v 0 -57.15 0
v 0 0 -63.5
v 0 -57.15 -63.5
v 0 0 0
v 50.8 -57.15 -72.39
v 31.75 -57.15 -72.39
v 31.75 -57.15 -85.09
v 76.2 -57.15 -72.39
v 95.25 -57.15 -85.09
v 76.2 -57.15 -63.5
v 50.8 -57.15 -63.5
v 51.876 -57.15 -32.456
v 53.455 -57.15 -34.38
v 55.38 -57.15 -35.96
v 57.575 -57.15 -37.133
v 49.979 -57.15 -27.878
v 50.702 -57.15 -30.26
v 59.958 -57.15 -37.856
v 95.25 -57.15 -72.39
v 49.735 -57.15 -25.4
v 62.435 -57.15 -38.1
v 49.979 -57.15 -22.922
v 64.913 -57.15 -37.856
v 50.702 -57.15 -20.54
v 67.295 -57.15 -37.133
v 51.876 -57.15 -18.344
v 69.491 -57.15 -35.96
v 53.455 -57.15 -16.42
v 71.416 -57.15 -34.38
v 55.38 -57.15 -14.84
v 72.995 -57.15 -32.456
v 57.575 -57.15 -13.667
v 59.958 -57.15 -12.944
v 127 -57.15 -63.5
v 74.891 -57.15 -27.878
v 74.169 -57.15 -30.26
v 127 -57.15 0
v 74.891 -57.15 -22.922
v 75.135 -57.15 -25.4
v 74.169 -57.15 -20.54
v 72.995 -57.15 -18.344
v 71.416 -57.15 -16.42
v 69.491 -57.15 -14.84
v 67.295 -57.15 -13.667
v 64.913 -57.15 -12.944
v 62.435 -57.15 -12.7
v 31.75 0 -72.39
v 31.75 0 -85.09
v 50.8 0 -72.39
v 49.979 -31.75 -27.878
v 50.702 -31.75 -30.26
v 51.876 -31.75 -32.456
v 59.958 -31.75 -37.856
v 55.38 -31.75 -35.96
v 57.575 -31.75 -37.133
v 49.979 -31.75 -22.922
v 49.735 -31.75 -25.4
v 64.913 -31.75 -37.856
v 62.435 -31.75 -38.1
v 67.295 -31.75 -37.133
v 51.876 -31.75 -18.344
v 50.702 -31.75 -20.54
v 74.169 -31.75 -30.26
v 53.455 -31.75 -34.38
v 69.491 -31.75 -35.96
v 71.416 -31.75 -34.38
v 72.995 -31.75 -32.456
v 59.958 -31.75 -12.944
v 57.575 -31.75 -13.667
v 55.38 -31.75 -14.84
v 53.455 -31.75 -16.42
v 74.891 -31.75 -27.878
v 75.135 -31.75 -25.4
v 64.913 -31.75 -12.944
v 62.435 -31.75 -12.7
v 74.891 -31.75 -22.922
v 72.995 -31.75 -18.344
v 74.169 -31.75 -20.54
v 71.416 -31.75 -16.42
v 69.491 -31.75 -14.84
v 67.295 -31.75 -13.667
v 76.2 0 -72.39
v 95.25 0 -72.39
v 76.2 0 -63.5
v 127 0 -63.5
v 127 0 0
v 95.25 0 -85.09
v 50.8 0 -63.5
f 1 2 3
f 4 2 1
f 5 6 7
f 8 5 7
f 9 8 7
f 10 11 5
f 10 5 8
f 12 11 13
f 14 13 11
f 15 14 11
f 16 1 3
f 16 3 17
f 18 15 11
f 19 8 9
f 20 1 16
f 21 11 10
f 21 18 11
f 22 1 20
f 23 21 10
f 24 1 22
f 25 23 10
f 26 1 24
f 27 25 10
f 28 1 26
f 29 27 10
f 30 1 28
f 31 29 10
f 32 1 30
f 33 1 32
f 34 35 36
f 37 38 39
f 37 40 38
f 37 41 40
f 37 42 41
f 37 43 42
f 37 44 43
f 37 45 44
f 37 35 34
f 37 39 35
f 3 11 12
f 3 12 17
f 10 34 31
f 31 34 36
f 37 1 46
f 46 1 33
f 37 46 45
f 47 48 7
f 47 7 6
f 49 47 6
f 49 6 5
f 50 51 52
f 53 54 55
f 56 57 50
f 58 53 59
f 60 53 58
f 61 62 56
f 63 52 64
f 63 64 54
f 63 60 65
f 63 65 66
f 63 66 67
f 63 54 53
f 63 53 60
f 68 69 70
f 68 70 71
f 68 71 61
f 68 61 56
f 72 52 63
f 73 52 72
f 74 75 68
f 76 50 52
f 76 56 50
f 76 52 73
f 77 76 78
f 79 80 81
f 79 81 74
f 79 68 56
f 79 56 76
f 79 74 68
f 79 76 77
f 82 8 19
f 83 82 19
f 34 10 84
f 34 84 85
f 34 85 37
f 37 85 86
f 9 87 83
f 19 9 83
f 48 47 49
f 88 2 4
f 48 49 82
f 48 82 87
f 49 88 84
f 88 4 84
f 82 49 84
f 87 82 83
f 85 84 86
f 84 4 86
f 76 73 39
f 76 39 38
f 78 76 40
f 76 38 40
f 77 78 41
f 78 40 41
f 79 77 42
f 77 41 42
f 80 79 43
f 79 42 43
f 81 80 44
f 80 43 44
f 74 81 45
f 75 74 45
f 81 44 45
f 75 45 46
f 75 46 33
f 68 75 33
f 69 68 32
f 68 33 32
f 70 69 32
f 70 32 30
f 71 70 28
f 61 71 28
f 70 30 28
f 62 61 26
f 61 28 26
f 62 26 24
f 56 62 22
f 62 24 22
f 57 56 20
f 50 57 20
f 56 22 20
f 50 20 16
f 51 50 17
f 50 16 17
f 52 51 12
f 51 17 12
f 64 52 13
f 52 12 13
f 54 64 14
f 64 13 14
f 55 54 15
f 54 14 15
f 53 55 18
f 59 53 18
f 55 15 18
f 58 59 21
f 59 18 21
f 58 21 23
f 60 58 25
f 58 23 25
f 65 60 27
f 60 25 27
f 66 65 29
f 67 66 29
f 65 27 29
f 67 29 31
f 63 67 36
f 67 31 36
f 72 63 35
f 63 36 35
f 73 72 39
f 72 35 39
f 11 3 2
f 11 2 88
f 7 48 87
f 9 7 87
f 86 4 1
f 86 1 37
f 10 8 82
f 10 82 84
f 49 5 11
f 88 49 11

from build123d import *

# Parameters (mm, degrees)
F0_W      = 127
F0_H      = 85.09
F1_DEPTH  = 57.15
F2_W      = 31.75
F2_H      = 12.7
F3_DEPTH  = 57.15
F4_W      = 50.8
F4_H      = 8.89
F5_DEPTH  = 57.15
F6_W      = 31.75
F6_H      = 12.7
F7_DEPTH  = 57.15
F8_W      = 50.8
F8_H      = 8.89
F9_DEPTH  = 57.15
F10_R     = 12.7
F11_DEPTH = 25.4


with BuildPart() as f1:
    # F0 (on Front) → F1 (new body)
    with BuildSketch(Plane.XZ):
        with Locations((63.5, -42.545)):
            Rectangle(F0_W, F0_H)
    extrude(amount=F1_DEPTH)

    # F2 (on face) → F3 (cut)
    with BuildSketch(Plane.XZ.offset(57.15)):
        with Locations((111.125, -78.74)):
            Rectangle(F2_W, F2_H)
    extrude(amount=-F3_DEPTH, mode=Mode.SUBTRACT)

    # F4 (on face) → F5 (cut)
    with BuildSketch(Plane.XZ.offset(57.15)):
        with Locations((101.6, -67.945)):
            Rectangle(F4_W, F4_H)
    extrude(amount=-F5_DEPTH, mode=Mode.SUBTRACT)

    # F6 (on face) → F7 (cut)
    with BuildSketch(Plane.XZ.offset(57.15)):
        with Locations((15.875, -78.74)):
            Rectangle(F6_W, F6_H)
    extrude(amount=-F7_DEPTH, mode=Mode.SUBTRACT)

    # F8 (on face) → F9 (cut)
    with BuildSketch(Plane.XZ.offset(57.15)):
        with Locations((25.4, -67.945)):
            Rectangle(F8_W, F8_H)
    extrude(amount=-F9_DEPTH, mode=Mode.SUBTRACT)

    # F10 (on face) → F11 (cut)
    with BuildSketch(Plane.XZ.offset(57.15)):
        with Locations((62.435351, -25.4)):
            Circle(F10_R)
    extrude(amount=-F11_DEPTH, mode=Mode.SUBTRACT)


solid = f1.part
